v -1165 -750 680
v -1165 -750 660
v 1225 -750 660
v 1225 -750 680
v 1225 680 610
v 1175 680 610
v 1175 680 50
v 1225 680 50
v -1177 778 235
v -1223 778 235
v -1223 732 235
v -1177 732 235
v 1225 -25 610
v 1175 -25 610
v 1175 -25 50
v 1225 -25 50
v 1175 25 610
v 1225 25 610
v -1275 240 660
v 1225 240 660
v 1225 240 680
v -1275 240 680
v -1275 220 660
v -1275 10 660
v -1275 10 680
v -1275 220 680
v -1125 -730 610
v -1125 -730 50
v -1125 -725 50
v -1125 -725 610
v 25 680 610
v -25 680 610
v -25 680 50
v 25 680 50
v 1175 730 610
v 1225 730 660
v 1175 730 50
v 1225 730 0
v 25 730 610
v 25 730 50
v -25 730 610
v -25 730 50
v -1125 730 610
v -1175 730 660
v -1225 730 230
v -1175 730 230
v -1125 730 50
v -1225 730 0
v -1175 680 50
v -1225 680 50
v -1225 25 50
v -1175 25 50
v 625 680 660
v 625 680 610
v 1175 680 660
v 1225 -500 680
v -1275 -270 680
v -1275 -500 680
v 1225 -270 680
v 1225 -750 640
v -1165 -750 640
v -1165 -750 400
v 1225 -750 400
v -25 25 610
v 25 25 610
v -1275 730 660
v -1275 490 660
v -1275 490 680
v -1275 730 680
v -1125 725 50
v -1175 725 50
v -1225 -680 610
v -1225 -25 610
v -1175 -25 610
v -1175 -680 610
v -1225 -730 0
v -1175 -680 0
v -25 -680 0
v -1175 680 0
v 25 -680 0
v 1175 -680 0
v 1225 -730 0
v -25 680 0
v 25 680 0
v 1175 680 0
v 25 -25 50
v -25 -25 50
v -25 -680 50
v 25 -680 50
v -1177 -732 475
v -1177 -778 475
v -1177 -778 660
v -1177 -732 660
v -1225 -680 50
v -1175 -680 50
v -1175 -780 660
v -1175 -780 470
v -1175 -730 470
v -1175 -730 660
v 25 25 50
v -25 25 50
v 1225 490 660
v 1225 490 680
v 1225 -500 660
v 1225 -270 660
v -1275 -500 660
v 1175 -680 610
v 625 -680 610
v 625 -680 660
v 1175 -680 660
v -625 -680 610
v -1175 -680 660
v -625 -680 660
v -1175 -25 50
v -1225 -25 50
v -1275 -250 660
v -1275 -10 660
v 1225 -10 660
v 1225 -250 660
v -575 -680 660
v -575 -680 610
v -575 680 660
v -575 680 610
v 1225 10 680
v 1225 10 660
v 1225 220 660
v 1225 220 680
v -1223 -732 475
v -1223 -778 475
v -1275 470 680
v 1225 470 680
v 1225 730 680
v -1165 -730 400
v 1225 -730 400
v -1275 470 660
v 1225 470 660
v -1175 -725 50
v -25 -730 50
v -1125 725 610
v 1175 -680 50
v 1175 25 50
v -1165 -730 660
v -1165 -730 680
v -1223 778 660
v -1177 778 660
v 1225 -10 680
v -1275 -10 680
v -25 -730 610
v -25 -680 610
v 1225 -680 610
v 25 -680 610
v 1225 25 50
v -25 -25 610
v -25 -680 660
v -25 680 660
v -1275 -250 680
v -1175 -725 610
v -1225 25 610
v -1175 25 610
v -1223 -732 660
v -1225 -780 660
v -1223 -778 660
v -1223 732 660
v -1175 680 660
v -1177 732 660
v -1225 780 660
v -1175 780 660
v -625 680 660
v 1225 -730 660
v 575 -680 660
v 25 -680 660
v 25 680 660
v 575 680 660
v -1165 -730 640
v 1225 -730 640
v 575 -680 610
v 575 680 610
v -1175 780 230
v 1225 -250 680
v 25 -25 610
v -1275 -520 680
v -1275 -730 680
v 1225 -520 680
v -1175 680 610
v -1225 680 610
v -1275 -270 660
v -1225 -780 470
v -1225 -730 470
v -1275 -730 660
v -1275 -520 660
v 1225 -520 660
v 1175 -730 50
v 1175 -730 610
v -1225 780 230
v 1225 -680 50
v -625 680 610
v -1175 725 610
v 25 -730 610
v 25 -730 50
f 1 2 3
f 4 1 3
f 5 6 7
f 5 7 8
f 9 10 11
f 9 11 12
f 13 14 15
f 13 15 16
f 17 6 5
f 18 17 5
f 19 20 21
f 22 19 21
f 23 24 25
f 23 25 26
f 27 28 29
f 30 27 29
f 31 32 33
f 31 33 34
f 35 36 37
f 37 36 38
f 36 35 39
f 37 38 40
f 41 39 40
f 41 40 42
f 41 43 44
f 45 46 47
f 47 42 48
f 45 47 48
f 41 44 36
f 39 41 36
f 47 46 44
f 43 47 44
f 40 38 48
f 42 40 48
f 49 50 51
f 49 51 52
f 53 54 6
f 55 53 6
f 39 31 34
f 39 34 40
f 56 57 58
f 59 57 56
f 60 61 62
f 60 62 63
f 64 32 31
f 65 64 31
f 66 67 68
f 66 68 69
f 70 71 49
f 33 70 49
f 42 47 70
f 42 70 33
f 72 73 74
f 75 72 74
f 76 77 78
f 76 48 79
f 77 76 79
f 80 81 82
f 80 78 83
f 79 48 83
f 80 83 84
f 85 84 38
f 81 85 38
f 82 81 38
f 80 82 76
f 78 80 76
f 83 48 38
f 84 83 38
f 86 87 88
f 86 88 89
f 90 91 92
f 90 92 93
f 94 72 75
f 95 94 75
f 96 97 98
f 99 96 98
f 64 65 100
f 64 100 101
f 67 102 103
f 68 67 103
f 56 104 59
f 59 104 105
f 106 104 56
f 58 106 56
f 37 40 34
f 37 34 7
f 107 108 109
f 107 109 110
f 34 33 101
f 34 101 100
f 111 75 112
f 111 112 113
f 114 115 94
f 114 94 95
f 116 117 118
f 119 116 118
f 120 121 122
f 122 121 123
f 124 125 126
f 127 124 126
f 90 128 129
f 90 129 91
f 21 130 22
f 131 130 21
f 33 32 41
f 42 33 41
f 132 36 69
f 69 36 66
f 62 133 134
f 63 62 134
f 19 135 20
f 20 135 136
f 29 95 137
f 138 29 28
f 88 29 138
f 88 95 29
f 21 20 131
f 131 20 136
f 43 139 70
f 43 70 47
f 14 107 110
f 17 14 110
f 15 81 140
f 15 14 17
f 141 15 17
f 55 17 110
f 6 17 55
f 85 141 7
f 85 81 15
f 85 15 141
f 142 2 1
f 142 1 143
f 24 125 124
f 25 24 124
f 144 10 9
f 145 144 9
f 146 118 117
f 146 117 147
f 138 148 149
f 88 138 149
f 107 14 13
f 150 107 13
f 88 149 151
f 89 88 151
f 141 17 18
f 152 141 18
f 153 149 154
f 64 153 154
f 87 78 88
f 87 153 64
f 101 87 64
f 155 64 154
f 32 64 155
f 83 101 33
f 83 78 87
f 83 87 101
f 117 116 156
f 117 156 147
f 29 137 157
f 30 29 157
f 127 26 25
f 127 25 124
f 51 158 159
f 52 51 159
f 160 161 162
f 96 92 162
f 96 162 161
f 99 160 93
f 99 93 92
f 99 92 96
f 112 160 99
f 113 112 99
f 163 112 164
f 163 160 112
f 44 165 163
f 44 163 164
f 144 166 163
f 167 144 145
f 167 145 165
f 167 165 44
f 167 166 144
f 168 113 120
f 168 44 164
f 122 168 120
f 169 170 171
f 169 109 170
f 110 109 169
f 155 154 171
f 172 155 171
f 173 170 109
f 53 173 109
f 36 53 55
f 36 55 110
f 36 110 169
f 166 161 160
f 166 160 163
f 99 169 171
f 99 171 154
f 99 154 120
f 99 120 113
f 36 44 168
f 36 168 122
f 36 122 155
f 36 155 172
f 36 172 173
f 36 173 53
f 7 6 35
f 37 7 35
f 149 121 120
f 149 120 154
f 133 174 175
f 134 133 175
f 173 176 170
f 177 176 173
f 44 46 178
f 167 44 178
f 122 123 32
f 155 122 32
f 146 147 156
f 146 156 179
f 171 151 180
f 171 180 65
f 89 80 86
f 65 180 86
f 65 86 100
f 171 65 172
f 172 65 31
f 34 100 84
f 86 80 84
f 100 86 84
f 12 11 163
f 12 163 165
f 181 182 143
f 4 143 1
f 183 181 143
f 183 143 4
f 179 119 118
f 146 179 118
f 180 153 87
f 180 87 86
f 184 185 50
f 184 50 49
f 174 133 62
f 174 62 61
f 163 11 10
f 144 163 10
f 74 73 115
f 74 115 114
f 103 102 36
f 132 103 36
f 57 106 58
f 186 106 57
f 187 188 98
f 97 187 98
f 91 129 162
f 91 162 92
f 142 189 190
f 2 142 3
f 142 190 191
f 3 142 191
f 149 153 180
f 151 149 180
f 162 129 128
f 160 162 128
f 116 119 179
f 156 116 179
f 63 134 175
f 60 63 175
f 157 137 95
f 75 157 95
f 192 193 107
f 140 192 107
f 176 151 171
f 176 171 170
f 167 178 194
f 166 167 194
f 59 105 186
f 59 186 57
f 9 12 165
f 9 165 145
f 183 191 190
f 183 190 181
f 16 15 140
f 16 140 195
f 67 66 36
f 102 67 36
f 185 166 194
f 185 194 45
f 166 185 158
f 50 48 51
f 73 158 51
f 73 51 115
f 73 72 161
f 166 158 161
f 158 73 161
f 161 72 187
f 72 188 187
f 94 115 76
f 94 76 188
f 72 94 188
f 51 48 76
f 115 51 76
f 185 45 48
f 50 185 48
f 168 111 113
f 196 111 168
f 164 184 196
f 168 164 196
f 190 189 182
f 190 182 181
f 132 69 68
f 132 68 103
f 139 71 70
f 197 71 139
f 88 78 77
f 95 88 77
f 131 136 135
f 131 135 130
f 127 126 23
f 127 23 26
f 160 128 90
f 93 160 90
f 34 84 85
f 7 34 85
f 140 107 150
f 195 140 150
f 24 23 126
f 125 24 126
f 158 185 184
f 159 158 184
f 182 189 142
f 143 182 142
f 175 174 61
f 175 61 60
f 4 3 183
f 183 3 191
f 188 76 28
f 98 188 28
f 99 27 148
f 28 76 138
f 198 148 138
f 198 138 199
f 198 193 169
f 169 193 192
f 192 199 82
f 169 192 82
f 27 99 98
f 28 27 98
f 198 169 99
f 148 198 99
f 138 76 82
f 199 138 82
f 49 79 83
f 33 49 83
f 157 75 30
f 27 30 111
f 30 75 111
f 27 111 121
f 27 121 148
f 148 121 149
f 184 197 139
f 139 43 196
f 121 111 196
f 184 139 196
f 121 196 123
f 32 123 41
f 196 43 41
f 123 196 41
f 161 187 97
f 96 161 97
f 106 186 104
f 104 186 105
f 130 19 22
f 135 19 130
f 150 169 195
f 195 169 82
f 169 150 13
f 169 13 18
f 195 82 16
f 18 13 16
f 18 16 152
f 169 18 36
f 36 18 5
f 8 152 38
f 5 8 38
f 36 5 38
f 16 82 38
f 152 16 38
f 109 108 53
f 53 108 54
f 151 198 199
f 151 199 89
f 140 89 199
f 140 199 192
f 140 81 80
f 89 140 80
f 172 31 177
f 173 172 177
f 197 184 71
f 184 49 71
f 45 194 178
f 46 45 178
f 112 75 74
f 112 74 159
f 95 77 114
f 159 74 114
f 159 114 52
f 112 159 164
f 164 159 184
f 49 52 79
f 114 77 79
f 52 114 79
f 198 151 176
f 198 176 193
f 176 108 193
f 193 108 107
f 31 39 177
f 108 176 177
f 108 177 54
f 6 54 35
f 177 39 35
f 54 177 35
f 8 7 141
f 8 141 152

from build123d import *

# Parameters (mm, degrees)
F0_W      = 2450
F0_H      = 1460
F0_W_2    = 50
F0_H_2    = 1360
F1_DEPTH  = 50
F2_W      = 50
F2_H      = 50
F2_H_2    = 25
F3_DEPTH  = 560
F4_W      = 550
F4_H      = 1360
F5_DEPTH  = 50
F7_W      = 50
F7_H      = 50
F8_DEPTH  = 5
F9_W      = 46
F9_H      = 46
F10_DEPTH = 185
F12_W     = 50
F12_H     = 50
F13_DEPTH = 5
F14_W     = 46
F14_H     = 46
F15_DEPTH = 425
F16_W     = 5
F16_H     = 560
F17_DEPTH = 50
F18_W     = 2390
F18_H     = 240
F19_DEPTH = 20
F20_W     = 50
F20_H     = 1460
F20_W_2   = 550
F20_H_2   = 1360
F20_W_3   = 2390
F20_H_3   = 20
F21_DEPTH = 20
F23_W     = 20
F23_H     = 20
F24_DEPTH = 2500


with BuildPart() as f1:
    # F0 (on Top) → F1 (new body)
    with BuildSketch(Plane.XY):
        Rectangle(F0_W, F0_H)
        Polygon((-1175, -680), (-1175, 680), (-25, 680), (25, 680), (1175, 680), (1175, -680), (25, -680), (-25, -680), align=None, mode=Mode.SUBTRACT)
        Rectangle(F0_W_2, F0_H_2)
    extrude(amount=F1_DEPTH)

    # F2 (on face) → F3 (join)
    with BuildSketch(Plane.XY.offset(50)):
        with Locations((-1200, 705)):
            Rectangle(F2_W, F2_H)
        with Locations((0, 705)):
            Rectangle(F2_W, F2_H)
        with Locations((1200, 705)):
            Rectangle(F2_W, F2_H)
        with Locations((1200, -705)):
            Rectangle(F2_W, F2_H)
        with Locations((0, -705)):
            Rectangle(F2_W, F2_H)
        with Locations((-1200, -705)):
            Rectangle(F2_W, F2_H)
        with Locations((-1200, -12.5)):
            Rectangle(F2_W, F2_H_2)
        with Locations((-1200, 12.5)):
            Rectangle(F2_W, F2_H_2)
        Polygon((-25, -25), (25, -25), (25, 25), (-25, 25), (-25, 0), align=None)
        with Locations((1200, 0)):
            Rectangle(F2_W, F2_H)
    extrude(amount=F3_DEPTH)

    # F4 (on face) → F5 (join)
    with BuildSketch(Plane.XY.offset(610)):
        Polygon((-1225, 730), (-1225, 25), (-1225, -730), (1225, -730), (1225, 730), (-1175, 730), align=None)
        with Locations((-900, 0)):
            Rectangle(F4_W, F4_H, mode=Mode.SUBTRACT)
        with Locations((-300, 0)):
            Rectangle(F4_W, F4_H, mode=Mode.SUBTRACT)
        with Locations((300, 0)):
            Rectangle(F4_W, F4_H, mode=Mode.SUBTRACT)
        with Locations((900, 0)):
            Rectangle(F4_W, F4_H, mode=Mode.SUBTRACT)
    extrude(amount=F5_DEPTH)

    # F7 (on offset) → F8 (join)
    with BuildSketch(Plane.XY.offset(470)):
        with Locations((-1200, -755)):
            Rectangle(F7_W, F7_H)
    extrude(amount=F8_DEPTH)

    # F9 (on face) → F10 (join, through all)
    with BuildSketch(Plane.XY.offset(475)):
        Polygon((-1175, -730), (-1225, -730), (-1225, -780), (-1223, -780), (-1175, -780), align=None)
        with Locations((-1200, -755)):
            Rectangle(F9_W, F9_H, mode=Mode.SUBTRACT)
    extrude(amount=F10_DEPTH)

    # F12 (on offset) → F13 (join)
    with BuildSketch(Plane.XY.offset(230)):
        with Locations((-1200, 755)):
            Rectangle(F12_W, F12_H)
    extrude(amount=F13_DEPTH)

    # F14 (on face) → F15 (join, through all)
    with BuildSketch(Plane.XY.offset(235)):
        Polygon((-1223, 780), (-1225, 780), (-1225, 730), (-1175, 730), (-1175, 780), align=None)
        with Locations((-1200, 755)):
            Rectangle(F14_W, F14_H, mode=Mode.SUBTRACT)
    extrude(amount=F15_DEPTH)

    # F16 (on face) → F17 (join)
    with BuildSketch(Plane.YZ.offset(-1175)):
        with Locations((727.5, 330)):
            Rectangle(F16_W, F16_H)
        Polygon((-725, 610.0000000001), (-730, 610.0000000001), (-730, 470), (-730, 50), (-725, 50), align=None)
    extrude(amount=F17_DEPTH)


with BuildPart() as f19:
    # F18 (on face) → F19 (new body)
    with BuildSketch(Plane.XZ.offset(730)):
        with Locations((30, 520)):
            Rectangle(F18_W, F18_H)
    extrude(amount=F19_DEPTH)


with BuildPart() as f21:
    # F20 (on face) → F21 (new body)
    with BuildSketch(Plane.XY.offset(660)):
        with Locations((-1250, 0)):
            Rectangle(F20_W, F20_H)
        Polygon((1225, -730), (1225, 730), (-1175, 730), (-1225, 730), (-1225, -730), (-1175, -730), (-1165, -730), align=None)
        with Locations((-900, 0)):
            Rectangle(F20_W_2, F20_H_2, mode=Mode.SUBTRACT)
        with Locations((-300, 0)):
            Rectangle(F20_W_2, F20_H_2, mode=Mode.SUBTRACT)
        with Locations((300, 0)):
            Rectangle(F20_W_2, F20_H_2, mode=Mode.SUBTRACT)
        with Locations((900, 0)):
            Rectangle(F20_W_2, F20_H_2, mode=Mode.SUBTRACT)
        with Locations((-900, 0)):
            Rectangle(F20_W_2, F20_H_2)
        with Locations((-300, 0)):
            Rectangle(F20_W_2, F20_H_2)
        with Locations((300, 0)):
            Rectangle(F20_W_2, F20_H_2)
        with Locations((900, 0)):
            Rectangle(F20_W_2, F20_H_2)
        with Locations((30, -740)):
            Rectangle(F20_W_3, F20_H_3)
    extrude(amount=F21_DEPTH)

    # F23 (on face) → F24 (cut, through all)
    with BuildSketch(Plane(origin=(-1275, 0, 0), x_dir=(0, -1, 0), z_dir=(-1, 0, 0))):
        with Locations((510, 670)):
            Rectangle(F23_W, F23_H)
        with Locations((-480, 670)):
            Rectangle(F23_W, F23_H)
        with Locations((-230, 670)):
            Rectangle(F23_W, F23_H)
        with Locations((0, 670)):
            Rectangle(F23_W, F23_H)
        with Locations((260, 670)):
            Rectangle(F23_W, F23_H)
    extrude(amount=-F24_DEPTH, mode=Mode.SUBTRACT)


solid = Compound([f1.part, f19.part, f21.part])
